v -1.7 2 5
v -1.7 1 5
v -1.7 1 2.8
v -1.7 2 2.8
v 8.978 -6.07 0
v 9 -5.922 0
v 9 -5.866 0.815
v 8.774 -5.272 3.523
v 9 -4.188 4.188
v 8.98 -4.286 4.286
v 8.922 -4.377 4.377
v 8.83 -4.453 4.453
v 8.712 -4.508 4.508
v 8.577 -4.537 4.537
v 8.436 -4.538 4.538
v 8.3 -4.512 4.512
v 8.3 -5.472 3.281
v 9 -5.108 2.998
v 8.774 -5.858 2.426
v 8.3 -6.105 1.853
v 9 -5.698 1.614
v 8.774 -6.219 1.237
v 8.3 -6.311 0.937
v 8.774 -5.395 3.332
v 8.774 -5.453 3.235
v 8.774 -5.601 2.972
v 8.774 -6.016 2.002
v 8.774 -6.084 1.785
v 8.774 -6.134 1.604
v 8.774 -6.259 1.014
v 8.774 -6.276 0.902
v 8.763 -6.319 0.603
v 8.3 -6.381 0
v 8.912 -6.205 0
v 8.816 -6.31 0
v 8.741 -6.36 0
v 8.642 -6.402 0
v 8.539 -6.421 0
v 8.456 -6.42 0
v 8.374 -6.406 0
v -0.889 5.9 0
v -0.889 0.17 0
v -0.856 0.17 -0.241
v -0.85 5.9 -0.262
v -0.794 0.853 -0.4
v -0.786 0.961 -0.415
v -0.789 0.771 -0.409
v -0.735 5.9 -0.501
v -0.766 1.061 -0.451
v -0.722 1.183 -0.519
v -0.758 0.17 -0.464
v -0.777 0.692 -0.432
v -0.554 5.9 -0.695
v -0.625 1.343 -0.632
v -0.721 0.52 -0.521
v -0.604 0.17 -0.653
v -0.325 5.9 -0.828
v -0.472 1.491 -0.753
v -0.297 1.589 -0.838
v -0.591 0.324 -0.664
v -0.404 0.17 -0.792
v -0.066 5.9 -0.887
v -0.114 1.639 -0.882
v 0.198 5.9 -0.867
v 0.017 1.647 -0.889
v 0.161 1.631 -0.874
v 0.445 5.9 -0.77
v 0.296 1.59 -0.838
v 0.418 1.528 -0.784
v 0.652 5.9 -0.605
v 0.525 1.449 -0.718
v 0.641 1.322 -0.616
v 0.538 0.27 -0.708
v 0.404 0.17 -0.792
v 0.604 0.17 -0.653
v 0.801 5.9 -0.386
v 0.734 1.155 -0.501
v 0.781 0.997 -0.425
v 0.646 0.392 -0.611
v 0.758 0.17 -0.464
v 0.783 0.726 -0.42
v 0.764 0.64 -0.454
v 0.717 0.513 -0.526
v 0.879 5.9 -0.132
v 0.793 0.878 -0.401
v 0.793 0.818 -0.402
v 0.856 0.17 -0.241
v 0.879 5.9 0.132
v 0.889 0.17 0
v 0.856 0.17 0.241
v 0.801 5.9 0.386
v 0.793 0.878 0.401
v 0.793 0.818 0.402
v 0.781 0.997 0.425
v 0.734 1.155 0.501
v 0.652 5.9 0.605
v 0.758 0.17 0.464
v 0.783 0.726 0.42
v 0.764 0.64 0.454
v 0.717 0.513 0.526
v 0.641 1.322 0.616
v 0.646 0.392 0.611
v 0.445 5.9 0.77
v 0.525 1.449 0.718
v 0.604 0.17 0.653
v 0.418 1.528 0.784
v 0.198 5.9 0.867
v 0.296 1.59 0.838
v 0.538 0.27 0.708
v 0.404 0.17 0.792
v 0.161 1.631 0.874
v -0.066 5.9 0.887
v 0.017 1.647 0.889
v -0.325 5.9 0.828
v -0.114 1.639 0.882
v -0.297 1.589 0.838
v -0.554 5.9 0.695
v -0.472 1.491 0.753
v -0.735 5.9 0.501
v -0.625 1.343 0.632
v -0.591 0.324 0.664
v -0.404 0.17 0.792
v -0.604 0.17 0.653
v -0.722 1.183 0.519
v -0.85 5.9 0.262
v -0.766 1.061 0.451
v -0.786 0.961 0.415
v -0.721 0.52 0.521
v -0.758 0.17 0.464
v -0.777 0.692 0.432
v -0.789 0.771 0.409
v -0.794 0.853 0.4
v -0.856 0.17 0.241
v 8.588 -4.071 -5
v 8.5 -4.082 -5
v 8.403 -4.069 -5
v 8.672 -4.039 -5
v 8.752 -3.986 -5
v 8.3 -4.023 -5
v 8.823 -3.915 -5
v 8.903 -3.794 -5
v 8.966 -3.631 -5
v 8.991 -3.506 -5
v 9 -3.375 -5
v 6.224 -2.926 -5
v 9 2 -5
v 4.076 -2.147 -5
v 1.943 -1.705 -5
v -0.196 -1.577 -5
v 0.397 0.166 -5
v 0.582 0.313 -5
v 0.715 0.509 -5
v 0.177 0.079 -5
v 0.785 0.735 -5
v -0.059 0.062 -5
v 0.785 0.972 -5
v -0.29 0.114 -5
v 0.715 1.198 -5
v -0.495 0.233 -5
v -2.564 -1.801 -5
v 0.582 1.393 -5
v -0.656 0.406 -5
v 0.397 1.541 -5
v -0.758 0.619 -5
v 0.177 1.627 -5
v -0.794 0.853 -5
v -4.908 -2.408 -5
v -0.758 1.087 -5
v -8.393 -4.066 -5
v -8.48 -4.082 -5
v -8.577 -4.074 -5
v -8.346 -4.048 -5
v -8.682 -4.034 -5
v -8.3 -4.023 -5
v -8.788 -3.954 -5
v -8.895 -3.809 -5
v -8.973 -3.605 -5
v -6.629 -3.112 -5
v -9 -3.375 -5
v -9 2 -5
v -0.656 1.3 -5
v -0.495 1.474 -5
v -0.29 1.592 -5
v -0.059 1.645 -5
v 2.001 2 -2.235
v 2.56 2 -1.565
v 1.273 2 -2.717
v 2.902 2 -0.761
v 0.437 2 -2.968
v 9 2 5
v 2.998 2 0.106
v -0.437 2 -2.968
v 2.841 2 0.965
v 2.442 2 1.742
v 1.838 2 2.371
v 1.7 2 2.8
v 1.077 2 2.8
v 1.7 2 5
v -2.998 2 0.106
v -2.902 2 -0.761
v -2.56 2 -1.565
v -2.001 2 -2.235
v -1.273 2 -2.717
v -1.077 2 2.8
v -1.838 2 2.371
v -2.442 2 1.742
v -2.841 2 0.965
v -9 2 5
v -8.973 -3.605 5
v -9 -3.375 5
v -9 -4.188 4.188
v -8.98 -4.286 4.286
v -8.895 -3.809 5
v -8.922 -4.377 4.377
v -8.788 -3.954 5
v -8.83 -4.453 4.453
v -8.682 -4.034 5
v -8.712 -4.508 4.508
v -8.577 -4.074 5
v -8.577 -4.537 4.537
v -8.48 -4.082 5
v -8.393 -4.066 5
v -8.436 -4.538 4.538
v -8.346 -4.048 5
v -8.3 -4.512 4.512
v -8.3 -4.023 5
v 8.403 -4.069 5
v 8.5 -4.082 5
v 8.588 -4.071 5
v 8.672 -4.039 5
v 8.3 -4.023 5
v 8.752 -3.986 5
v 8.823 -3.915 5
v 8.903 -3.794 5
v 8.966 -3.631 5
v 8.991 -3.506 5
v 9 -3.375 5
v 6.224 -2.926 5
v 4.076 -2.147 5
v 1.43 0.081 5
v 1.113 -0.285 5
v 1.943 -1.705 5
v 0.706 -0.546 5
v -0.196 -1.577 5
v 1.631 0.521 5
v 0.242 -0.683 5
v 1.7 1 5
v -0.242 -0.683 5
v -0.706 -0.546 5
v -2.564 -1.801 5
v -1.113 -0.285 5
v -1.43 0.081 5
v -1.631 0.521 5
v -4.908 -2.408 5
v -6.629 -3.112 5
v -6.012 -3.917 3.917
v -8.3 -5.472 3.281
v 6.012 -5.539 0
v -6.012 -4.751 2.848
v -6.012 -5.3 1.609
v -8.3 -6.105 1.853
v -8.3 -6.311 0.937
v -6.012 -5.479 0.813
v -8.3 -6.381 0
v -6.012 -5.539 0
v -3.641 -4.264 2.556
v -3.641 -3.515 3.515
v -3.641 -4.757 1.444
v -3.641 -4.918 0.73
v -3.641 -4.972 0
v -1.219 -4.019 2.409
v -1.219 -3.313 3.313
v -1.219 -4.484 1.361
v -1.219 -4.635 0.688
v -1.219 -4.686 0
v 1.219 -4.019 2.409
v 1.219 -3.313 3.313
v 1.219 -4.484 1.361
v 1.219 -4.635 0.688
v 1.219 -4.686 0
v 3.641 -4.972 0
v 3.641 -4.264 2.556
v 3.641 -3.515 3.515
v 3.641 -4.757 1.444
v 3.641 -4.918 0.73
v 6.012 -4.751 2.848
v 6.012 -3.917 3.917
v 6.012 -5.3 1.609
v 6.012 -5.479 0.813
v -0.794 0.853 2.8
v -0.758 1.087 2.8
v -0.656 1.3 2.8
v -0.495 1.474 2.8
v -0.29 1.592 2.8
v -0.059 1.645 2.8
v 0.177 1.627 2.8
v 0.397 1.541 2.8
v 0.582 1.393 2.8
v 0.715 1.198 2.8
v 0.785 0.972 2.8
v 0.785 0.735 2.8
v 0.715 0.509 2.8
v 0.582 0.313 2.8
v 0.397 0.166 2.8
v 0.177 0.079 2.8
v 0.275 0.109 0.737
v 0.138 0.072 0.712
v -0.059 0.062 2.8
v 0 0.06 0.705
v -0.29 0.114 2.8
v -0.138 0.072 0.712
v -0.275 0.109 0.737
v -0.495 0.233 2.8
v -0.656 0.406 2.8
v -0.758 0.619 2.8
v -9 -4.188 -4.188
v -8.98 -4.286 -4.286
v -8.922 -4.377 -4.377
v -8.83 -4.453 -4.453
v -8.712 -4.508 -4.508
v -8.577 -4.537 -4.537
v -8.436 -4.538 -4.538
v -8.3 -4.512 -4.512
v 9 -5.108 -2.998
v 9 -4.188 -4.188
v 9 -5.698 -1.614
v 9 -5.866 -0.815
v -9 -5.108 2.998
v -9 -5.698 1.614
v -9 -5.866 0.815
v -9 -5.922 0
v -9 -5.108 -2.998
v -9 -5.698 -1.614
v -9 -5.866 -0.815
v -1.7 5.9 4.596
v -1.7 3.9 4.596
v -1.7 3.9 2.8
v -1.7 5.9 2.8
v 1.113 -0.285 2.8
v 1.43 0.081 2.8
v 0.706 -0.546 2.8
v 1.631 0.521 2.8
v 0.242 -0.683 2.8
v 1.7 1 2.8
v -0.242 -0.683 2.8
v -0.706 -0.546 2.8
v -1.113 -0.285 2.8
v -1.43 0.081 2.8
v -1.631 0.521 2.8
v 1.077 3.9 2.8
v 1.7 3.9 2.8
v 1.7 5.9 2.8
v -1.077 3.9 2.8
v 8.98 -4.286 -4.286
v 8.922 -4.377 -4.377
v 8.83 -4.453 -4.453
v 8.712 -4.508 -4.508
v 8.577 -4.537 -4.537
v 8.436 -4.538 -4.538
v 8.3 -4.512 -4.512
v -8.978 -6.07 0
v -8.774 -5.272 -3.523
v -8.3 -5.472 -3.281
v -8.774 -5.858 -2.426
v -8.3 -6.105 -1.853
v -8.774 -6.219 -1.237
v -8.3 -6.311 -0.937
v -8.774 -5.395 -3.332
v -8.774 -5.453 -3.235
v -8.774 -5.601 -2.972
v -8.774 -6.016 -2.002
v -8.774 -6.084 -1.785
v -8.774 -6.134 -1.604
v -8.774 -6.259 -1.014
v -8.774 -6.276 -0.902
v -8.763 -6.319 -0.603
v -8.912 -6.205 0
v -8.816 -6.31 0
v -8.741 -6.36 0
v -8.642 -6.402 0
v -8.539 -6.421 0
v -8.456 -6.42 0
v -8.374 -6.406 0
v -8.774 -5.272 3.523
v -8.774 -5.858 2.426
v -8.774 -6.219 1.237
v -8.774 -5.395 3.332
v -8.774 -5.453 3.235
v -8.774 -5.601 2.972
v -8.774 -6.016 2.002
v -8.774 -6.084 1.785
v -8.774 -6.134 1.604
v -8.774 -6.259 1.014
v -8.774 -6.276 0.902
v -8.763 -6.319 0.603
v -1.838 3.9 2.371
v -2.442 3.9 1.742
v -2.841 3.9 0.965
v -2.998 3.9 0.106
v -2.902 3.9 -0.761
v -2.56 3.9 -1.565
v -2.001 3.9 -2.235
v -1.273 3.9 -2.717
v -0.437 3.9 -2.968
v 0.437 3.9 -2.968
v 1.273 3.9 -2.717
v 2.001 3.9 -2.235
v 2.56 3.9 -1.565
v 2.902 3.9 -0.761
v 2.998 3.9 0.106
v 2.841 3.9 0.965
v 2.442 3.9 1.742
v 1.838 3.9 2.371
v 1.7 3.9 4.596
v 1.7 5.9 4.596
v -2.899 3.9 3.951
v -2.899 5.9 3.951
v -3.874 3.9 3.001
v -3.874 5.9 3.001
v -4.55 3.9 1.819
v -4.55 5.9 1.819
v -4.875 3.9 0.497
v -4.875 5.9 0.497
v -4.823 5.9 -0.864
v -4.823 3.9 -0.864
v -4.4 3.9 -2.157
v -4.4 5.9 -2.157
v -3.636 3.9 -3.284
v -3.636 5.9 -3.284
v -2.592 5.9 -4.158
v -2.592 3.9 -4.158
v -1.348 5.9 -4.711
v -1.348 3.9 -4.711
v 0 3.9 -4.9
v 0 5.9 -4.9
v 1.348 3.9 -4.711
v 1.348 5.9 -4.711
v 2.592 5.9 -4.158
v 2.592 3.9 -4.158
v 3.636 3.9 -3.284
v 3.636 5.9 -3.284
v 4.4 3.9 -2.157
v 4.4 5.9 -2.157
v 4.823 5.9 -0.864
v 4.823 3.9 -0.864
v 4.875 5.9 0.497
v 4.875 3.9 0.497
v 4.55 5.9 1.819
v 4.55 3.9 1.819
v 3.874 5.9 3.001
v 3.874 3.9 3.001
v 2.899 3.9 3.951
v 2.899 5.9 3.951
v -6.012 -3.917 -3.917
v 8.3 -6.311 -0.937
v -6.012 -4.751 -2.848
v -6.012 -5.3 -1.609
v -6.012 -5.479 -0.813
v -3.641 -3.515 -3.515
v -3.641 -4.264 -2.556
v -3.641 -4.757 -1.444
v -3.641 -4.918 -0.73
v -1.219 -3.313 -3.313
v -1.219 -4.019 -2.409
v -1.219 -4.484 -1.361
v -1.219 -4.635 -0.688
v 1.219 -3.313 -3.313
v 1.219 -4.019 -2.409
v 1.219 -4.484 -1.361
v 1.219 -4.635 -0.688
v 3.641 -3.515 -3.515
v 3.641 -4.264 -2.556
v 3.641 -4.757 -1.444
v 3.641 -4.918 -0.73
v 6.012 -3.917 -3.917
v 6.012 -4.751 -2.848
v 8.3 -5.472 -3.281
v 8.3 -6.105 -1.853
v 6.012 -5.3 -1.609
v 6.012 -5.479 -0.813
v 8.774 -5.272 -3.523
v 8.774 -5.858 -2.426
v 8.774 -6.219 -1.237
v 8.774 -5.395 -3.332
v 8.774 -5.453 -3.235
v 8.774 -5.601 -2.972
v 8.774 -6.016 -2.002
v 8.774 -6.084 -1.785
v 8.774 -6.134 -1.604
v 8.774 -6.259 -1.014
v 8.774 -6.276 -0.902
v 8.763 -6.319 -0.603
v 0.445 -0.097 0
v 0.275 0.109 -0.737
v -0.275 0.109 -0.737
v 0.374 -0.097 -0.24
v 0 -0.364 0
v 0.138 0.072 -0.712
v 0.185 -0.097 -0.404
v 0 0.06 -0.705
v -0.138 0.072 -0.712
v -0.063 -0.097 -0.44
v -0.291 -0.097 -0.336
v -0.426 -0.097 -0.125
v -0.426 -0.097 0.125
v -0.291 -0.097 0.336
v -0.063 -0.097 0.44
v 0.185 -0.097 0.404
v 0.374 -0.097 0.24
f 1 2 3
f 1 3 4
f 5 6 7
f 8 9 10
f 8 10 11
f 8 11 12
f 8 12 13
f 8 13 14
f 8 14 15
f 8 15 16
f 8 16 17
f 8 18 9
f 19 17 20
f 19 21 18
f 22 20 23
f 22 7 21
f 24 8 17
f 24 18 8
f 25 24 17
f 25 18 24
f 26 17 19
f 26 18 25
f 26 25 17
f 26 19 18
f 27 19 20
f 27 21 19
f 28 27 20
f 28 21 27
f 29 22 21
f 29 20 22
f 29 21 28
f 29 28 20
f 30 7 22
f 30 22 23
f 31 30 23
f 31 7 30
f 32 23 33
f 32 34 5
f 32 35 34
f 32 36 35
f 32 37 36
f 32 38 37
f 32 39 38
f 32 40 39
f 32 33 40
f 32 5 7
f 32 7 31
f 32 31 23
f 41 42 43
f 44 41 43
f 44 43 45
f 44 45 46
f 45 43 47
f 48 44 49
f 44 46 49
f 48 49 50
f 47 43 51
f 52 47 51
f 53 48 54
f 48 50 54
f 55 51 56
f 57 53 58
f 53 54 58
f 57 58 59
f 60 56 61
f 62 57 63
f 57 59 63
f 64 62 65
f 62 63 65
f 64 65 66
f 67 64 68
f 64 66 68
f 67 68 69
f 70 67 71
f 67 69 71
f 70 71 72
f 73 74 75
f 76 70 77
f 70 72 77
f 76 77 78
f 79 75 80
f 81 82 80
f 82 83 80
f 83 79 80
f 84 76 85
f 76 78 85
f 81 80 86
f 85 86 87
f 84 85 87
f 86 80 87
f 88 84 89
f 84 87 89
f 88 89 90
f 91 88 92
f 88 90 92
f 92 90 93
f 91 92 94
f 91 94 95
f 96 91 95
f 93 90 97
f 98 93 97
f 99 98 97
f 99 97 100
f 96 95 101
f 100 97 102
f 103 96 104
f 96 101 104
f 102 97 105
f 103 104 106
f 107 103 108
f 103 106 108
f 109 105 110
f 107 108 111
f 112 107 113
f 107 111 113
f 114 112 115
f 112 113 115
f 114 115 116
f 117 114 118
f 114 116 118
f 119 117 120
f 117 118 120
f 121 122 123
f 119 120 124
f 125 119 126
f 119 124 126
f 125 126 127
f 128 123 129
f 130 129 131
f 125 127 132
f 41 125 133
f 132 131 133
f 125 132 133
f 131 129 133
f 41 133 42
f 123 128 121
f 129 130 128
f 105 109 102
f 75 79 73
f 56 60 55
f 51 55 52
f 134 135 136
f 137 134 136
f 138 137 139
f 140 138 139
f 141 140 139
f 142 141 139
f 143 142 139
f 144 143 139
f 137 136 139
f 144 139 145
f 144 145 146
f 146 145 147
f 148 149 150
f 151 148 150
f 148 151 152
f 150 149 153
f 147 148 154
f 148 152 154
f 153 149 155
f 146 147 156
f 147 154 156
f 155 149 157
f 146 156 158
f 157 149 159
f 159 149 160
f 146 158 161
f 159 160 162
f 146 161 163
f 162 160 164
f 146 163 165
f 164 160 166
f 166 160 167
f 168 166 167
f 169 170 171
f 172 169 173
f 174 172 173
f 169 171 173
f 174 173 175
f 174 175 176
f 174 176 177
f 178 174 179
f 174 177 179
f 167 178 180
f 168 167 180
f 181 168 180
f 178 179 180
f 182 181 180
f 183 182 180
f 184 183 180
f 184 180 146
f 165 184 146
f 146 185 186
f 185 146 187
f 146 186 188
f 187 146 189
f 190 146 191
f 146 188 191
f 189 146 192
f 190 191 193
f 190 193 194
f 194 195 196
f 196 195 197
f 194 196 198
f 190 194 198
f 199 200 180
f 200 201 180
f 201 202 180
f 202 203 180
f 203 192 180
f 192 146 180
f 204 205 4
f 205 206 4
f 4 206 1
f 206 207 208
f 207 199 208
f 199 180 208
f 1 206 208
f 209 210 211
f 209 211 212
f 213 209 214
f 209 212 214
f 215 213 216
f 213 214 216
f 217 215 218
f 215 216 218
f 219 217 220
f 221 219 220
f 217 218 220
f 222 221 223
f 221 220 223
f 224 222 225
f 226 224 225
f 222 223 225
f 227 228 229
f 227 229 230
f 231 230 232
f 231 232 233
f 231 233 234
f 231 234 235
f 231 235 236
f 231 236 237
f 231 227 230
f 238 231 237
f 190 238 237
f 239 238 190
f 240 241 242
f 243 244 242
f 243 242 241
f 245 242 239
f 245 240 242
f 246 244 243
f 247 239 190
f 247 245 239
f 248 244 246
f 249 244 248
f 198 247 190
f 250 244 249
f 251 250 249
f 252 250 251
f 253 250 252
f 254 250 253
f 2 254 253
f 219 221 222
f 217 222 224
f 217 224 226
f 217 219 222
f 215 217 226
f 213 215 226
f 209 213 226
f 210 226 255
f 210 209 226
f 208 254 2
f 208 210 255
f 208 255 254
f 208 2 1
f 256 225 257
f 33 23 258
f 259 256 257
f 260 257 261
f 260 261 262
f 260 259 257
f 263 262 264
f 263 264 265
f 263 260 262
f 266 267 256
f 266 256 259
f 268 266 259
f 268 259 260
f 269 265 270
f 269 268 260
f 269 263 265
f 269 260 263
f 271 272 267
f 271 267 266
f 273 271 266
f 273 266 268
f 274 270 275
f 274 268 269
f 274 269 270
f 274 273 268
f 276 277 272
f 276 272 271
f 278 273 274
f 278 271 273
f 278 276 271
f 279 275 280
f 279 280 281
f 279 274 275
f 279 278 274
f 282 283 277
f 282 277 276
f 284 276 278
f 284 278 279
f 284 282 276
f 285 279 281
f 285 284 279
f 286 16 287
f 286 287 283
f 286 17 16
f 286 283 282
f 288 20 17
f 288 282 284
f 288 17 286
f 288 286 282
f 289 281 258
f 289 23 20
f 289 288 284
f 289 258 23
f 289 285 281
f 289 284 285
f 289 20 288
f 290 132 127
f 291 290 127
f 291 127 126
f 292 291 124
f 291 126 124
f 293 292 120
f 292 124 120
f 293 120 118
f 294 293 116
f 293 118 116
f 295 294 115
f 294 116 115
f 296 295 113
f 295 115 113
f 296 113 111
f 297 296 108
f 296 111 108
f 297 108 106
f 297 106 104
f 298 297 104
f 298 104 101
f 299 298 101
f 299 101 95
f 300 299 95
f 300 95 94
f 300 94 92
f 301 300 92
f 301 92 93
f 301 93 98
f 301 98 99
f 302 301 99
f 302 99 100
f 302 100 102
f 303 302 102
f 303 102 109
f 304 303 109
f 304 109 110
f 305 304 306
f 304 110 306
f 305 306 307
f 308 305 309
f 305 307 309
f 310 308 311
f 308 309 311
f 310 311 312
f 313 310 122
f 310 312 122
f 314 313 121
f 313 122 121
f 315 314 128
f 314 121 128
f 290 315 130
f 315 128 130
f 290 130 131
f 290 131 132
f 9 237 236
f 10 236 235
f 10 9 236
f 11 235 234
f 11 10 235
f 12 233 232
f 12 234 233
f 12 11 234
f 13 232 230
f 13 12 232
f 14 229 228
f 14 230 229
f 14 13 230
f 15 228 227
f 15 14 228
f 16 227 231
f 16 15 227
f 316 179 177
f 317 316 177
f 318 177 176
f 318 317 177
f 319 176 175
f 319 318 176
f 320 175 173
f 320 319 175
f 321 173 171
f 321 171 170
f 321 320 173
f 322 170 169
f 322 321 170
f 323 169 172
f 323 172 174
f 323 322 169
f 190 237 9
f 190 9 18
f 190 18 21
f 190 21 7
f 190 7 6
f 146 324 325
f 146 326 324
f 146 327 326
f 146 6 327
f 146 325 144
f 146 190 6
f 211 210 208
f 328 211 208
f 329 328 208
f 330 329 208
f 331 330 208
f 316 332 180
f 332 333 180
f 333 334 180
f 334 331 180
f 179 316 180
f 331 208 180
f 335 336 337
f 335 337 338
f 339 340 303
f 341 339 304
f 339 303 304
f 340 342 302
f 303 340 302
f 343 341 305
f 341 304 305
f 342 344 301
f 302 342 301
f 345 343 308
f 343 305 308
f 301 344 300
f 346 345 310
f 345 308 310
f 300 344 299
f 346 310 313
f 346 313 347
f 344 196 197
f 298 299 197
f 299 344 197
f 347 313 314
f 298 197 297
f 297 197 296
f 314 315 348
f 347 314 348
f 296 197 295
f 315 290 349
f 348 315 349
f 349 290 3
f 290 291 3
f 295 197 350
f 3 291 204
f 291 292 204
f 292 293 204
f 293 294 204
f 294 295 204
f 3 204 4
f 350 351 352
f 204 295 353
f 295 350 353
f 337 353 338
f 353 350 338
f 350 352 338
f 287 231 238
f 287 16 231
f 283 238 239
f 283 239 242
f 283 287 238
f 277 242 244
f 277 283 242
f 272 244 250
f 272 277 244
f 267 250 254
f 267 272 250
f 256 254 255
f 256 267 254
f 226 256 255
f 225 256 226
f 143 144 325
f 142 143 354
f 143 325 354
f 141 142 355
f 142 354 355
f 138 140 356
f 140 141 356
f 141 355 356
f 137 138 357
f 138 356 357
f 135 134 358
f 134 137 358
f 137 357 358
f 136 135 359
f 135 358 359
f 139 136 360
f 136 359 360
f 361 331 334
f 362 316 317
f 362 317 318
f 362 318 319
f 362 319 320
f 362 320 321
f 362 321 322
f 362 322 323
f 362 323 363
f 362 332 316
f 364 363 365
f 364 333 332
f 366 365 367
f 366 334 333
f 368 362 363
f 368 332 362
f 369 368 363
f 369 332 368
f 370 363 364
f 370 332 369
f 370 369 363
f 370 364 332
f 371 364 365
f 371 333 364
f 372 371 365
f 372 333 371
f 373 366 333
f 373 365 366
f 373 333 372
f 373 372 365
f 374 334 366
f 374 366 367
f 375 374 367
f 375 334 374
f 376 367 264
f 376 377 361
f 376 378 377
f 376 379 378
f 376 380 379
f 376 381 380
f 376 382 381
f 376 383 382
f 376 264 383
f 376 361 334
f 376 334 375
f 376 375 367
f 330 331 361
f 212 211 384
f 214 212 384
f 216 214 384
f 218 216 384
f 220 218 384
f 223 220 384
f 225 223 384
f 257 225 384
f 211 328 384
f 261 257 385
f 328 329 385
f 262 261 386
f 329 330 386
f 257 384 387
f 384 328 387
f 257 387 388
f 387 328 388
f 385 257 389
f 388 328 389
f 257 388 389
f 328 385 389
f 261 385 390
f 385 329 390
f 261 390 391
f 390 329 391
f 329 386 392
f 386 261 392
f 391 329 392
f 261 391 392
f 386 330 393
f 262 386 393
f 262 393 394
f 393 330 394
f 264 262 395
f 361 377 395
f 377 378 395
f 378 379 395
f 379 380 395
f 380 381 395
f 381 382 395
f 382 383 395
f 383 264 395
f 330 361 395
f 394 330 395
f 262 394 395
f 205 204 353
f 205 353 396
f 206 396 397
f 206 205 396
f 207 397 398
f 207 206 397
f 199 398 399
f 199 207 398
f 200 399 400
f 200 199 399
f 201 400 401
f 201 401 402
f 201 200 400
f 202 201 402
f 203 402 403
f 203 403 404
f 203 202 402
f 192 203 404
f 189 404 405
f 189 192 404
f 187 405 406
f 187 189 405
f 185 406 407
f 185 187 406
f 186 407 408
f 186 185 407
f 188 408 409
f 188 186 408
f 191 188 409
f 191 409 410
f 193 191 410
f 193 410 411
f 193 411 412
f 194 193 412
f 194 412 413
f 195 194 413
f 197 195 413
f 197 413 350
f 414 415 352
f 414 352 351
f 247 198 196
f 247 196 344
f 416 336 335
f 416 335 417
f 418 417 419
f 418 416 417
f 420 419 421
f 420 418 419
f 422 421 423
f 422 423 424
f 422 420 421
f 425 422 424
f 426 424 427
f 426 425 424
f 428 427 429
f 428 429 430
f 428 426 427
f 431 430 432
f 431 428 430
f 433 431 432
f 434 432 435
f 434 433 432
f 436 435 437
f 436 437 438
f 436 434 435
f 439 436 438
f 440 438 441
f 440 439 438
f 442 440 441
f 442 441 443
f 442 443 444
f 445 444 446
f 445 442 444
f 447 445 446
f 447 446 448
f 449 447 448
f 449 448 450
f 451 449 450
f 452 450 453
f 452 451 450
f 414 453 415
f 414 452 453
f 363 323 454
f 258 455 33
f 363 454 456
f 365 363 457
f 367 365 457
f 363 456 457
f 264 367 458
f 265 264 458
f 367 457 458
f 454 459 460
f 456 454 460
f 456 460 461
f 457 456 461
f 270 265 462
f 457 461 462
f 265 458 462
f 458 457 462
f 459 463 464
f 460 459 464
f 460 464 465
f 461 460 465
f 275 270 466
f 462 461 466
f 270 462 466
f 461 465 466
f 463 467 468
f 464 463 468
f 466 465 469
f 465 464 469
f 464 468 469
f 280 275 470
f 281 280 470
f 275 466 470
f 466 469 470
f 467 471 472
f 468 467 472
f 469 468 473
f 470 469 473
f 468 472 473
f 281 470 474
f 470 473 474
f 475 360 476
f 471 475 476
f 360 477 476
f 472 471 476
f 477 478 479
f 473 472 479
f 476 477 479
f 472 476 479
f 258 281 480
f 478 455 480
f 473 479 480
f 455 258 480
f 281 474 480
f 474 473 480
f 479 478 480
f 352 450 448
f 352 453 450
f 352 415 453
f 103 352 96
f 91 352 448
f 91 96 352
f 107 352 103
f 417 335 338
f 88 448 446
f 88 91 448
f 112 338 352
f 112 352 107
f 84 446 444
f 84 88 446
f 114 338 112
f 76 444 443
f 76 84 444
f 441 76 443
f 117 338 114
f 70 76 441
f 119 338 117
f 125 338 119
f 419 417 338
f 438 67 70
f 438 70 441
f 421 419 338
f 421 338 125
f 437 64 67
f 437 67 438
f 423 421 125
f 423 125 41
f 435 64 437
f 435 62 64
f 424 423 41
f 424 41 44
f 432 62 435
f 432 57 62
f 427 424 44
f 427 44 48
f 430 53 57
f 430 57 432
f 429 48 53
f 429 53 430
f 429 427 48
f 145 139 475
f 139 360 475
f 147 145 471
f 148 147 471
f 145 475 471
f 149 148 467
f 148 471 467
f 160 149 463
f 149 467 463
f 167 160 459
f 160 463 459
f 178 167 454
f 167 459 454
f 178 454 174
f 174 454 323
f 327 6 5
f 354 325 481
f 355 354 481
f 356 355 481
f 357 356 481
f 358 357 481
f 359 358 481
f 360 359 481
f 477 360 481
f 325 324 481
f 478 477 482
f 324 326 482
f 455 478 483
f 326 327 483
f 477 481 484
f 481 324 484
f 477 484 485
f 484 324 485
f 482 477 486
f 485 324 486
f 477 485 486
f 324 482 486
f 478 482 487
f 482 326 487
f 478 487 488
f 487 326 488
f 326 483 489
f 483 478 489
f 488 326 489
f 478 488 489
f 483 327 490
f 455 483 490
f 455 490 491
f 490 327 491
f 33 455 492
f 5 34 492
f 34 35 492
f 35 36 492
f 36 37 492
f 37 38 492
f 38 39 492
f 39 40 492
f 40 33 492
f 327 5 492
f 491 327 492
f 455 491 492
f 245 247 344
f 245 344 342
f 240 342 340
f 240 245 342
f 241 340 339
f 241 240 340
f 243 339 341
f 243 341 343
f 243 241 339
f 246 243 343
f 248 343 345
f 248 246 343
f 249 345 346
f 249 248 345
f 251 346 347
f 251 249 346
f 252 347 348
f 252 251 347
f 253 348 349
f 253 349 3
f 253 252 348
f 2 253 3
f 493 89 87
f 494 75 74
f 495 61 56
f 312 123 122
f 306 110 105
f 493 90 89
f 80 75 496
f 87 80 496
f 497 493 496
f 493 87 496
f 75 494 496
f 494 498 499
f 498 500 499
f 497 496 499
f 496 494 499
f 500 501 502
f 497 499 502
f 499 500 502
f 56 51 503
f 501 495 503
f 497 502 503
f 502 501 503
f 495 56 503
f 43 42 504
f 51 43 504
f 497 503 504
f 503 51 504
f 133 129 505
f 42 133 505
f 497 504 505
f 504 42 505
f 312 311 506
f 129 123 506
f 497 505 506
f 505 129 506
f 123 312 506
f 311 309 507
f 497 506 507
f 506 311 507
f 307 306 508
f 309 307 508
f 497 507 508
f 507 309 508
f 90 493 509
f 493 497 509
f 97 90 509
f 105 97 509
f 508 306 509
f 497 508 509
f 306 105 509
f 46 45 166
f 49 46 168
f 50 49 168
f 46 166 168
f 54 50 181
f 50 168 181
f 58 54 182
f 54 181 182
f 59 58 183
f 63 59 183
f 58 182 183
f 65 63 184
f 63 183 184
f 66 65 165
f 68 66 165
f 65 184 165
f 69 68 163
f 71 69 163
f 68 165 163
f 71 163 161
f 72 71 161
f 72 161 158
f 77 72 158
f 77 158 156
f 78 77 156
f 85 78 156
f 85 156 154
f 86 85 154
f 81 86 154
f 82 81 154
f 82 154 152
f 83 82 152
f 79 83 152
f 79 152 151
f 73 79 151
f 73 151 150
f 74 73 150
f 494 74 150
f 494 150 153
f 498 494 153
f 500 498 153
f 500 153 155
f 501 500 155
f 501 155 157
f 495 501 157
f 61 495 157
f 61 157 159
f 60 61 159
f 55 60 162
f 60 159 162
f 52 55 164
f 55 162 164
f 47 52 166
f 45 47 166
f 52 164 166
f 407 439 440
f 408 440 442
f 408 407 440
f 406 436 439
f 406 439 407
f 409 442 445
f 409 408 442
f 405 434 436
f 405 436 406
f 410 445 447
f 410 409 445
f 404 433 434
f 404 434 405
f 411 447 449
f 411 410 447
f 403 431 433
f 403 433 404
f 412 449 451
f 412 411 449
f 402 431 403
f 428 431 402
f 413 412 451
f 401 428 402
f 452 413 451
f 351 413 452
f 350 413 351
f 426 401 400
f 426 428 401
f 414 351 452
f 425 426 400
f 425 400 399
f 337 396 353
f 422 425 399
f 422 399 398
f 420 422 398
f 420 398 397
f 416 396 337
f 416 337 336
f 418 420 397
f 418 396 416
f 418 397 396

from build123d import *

# Parameters (mm, degrees)
BOSS_EXTRUDE1_DEPTH            = 9
SKETCH4_W                      = 18
SKETCH4_H                      = 44.313566923
CUT_EXTRUDE3_DEPTH             = 6
FILLET1_R                      = 0.5
CUT_EXTRUDE4_DEPTH             = 20
CUT_EXTRUDE5_DEPTH             = 19.0000001
BOSS_EXTRUDE2_DEPTH            = 18
FILLET2_R                      = 3
SKETCH11_OUTSIDE_W             = 65.077
SKETCH11_OUTSIDE_H             = 50.285
SKETCH11_OUTSIDE_W_2           = 10
SKETCH11_OUTSIDE_H_2           = 20
CUT_EXTRUDE6_DEPTH             = 19.0000001
F_2_56_TAPPED_HOLE1_D          = 1.778
F_2_56_TAPPED_HOLE1_DEPTH      = 5.73
F_2_56_TAPPED_HOLE1_TIP        = 0.53416509
CUT_EXTRUDE7_DEPTH             = 2.2
F_1_16_0_0625_DIAMETER_HOLE1_D = 1.5875


with BuildPart() as part:
    # Sketch1 → Boss-Extrude1 (new body, symmetric)
    with BuildSketch(Plane(origin=(0, 0, 0), x_dir=(0, 0, -1), z_dir=(1, 0, 0))):
        with BuildLine():
            Line((3.00520382, -3.00520382), (20, 13.98959236))
            Line((20, 13.98959236), (20, 30))
            Line((20, 30), (0, 30))
            Line((0, 30), (0, -4.25))
            ThreePointArc((0, -4.25), (1.626404588, -3.926488013), (3.00520382, -3.00520382))
        make_face()
    extrude(amount=BOSS_EXTRUDE1_DEPTH, both=True)

    # Sweep1: sweep along a path in Sketch2
    with BuildLine(Plane(origin=(0, 0, 0), x_dir=(0, 0, -1), z_dir=(1, 0, 0))) as sweep1_path:
        Line((20, 13.98959236), (3.00520382, -3.00520382))
        ThreePointArc((3.00520382, -3.00520382), (1.626404588, -3.926488013), (0, -4.25))
    # Sketch3 → Sweep1 (sweep)
    with BuildSketch(Plane.XY):
        with BuildLine():
            Line((9, -4.25), (-9, -4.25))
            Line((-9, -4.25), (-9, -6.701215317))
            ThreePointArc((-9, -6.701215317), (0, -4.65), (9, -6.701215317))
            Line((9, -6.701215317), (9, -4.25))
        make_face()
    sweep(path=sweep1_path.line)

    # Sketch4 → Cut-Extrude3 (cut)
    with BuildSketch(Plane(origin=(0, 0, -20), x_dir=(-1, 0, 0), z_dir=(0, 0, -1))):
        with Locations((0, 7.843216539)):
            Rectangle(SKETCH4_W, SKETCH4_H)
    extrude(amount=CUT_EXTRUDE3_DEPTH, mode=Mode.SUBTRACT)

    # Fillet1
    fillet1_edges = [part.edges().sort_by_distance(p)[0] for p in [
        (9, 2.89228781, -12.369237397),
        (-9, 2.89228781, -12.369237397),
        (9, -6.191115675, -2.564444079),
        (-9, -6.191115675, -2.564444079),
    ]]
    fillet(fillet1_edges, radius=FILLET1_R)

    # Mirror1: part across plane


with BuildPart() as part_1:
    add(part.part)
    add(part.part.mirror(Plane(origin=(9, 30, 0), x_dir=(1, 0, 0), z_dir=(0, 0, -1))))

    # Sketch5 → Cut-Extrude4 (cut, symmetric)
    with BuildSketch(Plane(origin=(0, 0, 0), x_dir=(0, 0, -1), z_dir=(1, 0, 0))):
        Polygon((20, 16), (-7.485561137, 10.657348129), (-11.245391787, 30), (20, 30), align=None)
    extrude(amount=CUT_EXTRUDE4_DEPTH, both=True, mode=Mode.SUBTRACT)

    # Sketch8 → Cut-Extrude5 (cut, through all)
    with BuildSketch(Plane.ZY.offset(9)):
        Polygon((10.6659344, 27.018950173), (20, 28), (20, 30), (11.245391787, 30), align=None)
    extrude(amount=-CUT_EXTRUDE5_DEPTH, mode=Mode.SUBTRACT)

    # Sketch10 → Boss-Extrude2 (add)
    with BuildSketch(Plane.ZY.offset(9)):
        Polygon((20, 28), (29.945218954, 29.045284633), (30.258804343, 26.061718947), (20, 24.983475161), align=None)
    extrude(amount=-BOSS_EXTRUDE2_DEPTH)

    # Fillet2
    fillet2_edges = [part_1.edges().sort_by_distance(p)[0] for p in [
        (0, 24.983475161, 20),
        (0, 10.657348129, 7.485561137),
    ]]
    fillet(fillet2_edges, radius=FILLET2_R)

    # Sketch11 outside → Cut-Extrude6 (cut, through all)
    with BuildSketch(Plane.ZY.offset(9)):
        with Locations((5.1295, 11.3115)):
            Rectangle(SKETCH11_OUTSIDE_W, SKETCH11_OUTSIDE_H)
        with Locations((0, -8)):
            Rectangle(SKETCH11_OUTSIDE_W_2, SKETCH11_OUTSIDE_H_2, mode=Mode.SUBTRACT)
    extrude(amount=-CUT_EXTRUDE6_DEPTH, mode=Mode.SUBTRACT)

    # Sketch13 → Revolve1 (revolve)
    with BuildSketch(Plane(origin=(0, 0, 0), x_dir=(0, 0, -1), z_dir=(1, 0, 0))):
        Polygon((0, 2), (0, 5.9), (-4.9, 5.9), (-4.9, 3.9), (-3, 3.9), (-3, 2), align=None)
    revolve(axis=Axis((0, 0, 0), (0, -1, 0)))

    # #2-56 Tapped Hole1
    with Locations(Plane(origin=(0, 5.9, 0), x_dir=(1, 0, 0), z_dir=(0, 1, 0))):
        with Locations((0, 0)):
            Hole(F_2_56_TAPPED_HOLE1_D / 2, depth=F_2_56_TAPPED_HOLE1_DEPTH)
            with Locations((0, 0, -(F_2_56_TAPPED_HOLE1_DEPTH + F_2_56_TAPPED_HOLE1_TIP / 2))):  # 118° drill point
                Cone(0, F_2_56_TAPPED_HOLE1_D / 2, F_2_56_TAPPED_HOLE1_TIP, mode=Mode.SUBTRACT)

    # Sketch16 → Cut-Extrude7 (cut)
    with BuildSketch(Plane.XY.offset(5)):
        with BuildLine():
            Line((1.7, 7.96125108), (1.7, 1))
            ThreePointArc((1.7, 1), (0, -0.7), (-1.7, 1))
            Line((-1.7, 1), (-1.7, 7.96125108))
            ThreePointArc((-1.7, 7.96125108), (0, 9.66125108), (1.7, 7.96125108))
        make_face()
    extrude(amount=-CUT_EXTRUDE7_DEPTH, mode=Mode.SUBTRACT)

    # 1/16 (0.0625) Diameter Hole1 (through all)
    with Locations(Plane.XY.offset(2.8)):
        with Locations((0, 0.853308914)):
            Hole(F_1_16_0_0625_DIAMETER_HOLE1_D / 2)


solid = part_1.part
